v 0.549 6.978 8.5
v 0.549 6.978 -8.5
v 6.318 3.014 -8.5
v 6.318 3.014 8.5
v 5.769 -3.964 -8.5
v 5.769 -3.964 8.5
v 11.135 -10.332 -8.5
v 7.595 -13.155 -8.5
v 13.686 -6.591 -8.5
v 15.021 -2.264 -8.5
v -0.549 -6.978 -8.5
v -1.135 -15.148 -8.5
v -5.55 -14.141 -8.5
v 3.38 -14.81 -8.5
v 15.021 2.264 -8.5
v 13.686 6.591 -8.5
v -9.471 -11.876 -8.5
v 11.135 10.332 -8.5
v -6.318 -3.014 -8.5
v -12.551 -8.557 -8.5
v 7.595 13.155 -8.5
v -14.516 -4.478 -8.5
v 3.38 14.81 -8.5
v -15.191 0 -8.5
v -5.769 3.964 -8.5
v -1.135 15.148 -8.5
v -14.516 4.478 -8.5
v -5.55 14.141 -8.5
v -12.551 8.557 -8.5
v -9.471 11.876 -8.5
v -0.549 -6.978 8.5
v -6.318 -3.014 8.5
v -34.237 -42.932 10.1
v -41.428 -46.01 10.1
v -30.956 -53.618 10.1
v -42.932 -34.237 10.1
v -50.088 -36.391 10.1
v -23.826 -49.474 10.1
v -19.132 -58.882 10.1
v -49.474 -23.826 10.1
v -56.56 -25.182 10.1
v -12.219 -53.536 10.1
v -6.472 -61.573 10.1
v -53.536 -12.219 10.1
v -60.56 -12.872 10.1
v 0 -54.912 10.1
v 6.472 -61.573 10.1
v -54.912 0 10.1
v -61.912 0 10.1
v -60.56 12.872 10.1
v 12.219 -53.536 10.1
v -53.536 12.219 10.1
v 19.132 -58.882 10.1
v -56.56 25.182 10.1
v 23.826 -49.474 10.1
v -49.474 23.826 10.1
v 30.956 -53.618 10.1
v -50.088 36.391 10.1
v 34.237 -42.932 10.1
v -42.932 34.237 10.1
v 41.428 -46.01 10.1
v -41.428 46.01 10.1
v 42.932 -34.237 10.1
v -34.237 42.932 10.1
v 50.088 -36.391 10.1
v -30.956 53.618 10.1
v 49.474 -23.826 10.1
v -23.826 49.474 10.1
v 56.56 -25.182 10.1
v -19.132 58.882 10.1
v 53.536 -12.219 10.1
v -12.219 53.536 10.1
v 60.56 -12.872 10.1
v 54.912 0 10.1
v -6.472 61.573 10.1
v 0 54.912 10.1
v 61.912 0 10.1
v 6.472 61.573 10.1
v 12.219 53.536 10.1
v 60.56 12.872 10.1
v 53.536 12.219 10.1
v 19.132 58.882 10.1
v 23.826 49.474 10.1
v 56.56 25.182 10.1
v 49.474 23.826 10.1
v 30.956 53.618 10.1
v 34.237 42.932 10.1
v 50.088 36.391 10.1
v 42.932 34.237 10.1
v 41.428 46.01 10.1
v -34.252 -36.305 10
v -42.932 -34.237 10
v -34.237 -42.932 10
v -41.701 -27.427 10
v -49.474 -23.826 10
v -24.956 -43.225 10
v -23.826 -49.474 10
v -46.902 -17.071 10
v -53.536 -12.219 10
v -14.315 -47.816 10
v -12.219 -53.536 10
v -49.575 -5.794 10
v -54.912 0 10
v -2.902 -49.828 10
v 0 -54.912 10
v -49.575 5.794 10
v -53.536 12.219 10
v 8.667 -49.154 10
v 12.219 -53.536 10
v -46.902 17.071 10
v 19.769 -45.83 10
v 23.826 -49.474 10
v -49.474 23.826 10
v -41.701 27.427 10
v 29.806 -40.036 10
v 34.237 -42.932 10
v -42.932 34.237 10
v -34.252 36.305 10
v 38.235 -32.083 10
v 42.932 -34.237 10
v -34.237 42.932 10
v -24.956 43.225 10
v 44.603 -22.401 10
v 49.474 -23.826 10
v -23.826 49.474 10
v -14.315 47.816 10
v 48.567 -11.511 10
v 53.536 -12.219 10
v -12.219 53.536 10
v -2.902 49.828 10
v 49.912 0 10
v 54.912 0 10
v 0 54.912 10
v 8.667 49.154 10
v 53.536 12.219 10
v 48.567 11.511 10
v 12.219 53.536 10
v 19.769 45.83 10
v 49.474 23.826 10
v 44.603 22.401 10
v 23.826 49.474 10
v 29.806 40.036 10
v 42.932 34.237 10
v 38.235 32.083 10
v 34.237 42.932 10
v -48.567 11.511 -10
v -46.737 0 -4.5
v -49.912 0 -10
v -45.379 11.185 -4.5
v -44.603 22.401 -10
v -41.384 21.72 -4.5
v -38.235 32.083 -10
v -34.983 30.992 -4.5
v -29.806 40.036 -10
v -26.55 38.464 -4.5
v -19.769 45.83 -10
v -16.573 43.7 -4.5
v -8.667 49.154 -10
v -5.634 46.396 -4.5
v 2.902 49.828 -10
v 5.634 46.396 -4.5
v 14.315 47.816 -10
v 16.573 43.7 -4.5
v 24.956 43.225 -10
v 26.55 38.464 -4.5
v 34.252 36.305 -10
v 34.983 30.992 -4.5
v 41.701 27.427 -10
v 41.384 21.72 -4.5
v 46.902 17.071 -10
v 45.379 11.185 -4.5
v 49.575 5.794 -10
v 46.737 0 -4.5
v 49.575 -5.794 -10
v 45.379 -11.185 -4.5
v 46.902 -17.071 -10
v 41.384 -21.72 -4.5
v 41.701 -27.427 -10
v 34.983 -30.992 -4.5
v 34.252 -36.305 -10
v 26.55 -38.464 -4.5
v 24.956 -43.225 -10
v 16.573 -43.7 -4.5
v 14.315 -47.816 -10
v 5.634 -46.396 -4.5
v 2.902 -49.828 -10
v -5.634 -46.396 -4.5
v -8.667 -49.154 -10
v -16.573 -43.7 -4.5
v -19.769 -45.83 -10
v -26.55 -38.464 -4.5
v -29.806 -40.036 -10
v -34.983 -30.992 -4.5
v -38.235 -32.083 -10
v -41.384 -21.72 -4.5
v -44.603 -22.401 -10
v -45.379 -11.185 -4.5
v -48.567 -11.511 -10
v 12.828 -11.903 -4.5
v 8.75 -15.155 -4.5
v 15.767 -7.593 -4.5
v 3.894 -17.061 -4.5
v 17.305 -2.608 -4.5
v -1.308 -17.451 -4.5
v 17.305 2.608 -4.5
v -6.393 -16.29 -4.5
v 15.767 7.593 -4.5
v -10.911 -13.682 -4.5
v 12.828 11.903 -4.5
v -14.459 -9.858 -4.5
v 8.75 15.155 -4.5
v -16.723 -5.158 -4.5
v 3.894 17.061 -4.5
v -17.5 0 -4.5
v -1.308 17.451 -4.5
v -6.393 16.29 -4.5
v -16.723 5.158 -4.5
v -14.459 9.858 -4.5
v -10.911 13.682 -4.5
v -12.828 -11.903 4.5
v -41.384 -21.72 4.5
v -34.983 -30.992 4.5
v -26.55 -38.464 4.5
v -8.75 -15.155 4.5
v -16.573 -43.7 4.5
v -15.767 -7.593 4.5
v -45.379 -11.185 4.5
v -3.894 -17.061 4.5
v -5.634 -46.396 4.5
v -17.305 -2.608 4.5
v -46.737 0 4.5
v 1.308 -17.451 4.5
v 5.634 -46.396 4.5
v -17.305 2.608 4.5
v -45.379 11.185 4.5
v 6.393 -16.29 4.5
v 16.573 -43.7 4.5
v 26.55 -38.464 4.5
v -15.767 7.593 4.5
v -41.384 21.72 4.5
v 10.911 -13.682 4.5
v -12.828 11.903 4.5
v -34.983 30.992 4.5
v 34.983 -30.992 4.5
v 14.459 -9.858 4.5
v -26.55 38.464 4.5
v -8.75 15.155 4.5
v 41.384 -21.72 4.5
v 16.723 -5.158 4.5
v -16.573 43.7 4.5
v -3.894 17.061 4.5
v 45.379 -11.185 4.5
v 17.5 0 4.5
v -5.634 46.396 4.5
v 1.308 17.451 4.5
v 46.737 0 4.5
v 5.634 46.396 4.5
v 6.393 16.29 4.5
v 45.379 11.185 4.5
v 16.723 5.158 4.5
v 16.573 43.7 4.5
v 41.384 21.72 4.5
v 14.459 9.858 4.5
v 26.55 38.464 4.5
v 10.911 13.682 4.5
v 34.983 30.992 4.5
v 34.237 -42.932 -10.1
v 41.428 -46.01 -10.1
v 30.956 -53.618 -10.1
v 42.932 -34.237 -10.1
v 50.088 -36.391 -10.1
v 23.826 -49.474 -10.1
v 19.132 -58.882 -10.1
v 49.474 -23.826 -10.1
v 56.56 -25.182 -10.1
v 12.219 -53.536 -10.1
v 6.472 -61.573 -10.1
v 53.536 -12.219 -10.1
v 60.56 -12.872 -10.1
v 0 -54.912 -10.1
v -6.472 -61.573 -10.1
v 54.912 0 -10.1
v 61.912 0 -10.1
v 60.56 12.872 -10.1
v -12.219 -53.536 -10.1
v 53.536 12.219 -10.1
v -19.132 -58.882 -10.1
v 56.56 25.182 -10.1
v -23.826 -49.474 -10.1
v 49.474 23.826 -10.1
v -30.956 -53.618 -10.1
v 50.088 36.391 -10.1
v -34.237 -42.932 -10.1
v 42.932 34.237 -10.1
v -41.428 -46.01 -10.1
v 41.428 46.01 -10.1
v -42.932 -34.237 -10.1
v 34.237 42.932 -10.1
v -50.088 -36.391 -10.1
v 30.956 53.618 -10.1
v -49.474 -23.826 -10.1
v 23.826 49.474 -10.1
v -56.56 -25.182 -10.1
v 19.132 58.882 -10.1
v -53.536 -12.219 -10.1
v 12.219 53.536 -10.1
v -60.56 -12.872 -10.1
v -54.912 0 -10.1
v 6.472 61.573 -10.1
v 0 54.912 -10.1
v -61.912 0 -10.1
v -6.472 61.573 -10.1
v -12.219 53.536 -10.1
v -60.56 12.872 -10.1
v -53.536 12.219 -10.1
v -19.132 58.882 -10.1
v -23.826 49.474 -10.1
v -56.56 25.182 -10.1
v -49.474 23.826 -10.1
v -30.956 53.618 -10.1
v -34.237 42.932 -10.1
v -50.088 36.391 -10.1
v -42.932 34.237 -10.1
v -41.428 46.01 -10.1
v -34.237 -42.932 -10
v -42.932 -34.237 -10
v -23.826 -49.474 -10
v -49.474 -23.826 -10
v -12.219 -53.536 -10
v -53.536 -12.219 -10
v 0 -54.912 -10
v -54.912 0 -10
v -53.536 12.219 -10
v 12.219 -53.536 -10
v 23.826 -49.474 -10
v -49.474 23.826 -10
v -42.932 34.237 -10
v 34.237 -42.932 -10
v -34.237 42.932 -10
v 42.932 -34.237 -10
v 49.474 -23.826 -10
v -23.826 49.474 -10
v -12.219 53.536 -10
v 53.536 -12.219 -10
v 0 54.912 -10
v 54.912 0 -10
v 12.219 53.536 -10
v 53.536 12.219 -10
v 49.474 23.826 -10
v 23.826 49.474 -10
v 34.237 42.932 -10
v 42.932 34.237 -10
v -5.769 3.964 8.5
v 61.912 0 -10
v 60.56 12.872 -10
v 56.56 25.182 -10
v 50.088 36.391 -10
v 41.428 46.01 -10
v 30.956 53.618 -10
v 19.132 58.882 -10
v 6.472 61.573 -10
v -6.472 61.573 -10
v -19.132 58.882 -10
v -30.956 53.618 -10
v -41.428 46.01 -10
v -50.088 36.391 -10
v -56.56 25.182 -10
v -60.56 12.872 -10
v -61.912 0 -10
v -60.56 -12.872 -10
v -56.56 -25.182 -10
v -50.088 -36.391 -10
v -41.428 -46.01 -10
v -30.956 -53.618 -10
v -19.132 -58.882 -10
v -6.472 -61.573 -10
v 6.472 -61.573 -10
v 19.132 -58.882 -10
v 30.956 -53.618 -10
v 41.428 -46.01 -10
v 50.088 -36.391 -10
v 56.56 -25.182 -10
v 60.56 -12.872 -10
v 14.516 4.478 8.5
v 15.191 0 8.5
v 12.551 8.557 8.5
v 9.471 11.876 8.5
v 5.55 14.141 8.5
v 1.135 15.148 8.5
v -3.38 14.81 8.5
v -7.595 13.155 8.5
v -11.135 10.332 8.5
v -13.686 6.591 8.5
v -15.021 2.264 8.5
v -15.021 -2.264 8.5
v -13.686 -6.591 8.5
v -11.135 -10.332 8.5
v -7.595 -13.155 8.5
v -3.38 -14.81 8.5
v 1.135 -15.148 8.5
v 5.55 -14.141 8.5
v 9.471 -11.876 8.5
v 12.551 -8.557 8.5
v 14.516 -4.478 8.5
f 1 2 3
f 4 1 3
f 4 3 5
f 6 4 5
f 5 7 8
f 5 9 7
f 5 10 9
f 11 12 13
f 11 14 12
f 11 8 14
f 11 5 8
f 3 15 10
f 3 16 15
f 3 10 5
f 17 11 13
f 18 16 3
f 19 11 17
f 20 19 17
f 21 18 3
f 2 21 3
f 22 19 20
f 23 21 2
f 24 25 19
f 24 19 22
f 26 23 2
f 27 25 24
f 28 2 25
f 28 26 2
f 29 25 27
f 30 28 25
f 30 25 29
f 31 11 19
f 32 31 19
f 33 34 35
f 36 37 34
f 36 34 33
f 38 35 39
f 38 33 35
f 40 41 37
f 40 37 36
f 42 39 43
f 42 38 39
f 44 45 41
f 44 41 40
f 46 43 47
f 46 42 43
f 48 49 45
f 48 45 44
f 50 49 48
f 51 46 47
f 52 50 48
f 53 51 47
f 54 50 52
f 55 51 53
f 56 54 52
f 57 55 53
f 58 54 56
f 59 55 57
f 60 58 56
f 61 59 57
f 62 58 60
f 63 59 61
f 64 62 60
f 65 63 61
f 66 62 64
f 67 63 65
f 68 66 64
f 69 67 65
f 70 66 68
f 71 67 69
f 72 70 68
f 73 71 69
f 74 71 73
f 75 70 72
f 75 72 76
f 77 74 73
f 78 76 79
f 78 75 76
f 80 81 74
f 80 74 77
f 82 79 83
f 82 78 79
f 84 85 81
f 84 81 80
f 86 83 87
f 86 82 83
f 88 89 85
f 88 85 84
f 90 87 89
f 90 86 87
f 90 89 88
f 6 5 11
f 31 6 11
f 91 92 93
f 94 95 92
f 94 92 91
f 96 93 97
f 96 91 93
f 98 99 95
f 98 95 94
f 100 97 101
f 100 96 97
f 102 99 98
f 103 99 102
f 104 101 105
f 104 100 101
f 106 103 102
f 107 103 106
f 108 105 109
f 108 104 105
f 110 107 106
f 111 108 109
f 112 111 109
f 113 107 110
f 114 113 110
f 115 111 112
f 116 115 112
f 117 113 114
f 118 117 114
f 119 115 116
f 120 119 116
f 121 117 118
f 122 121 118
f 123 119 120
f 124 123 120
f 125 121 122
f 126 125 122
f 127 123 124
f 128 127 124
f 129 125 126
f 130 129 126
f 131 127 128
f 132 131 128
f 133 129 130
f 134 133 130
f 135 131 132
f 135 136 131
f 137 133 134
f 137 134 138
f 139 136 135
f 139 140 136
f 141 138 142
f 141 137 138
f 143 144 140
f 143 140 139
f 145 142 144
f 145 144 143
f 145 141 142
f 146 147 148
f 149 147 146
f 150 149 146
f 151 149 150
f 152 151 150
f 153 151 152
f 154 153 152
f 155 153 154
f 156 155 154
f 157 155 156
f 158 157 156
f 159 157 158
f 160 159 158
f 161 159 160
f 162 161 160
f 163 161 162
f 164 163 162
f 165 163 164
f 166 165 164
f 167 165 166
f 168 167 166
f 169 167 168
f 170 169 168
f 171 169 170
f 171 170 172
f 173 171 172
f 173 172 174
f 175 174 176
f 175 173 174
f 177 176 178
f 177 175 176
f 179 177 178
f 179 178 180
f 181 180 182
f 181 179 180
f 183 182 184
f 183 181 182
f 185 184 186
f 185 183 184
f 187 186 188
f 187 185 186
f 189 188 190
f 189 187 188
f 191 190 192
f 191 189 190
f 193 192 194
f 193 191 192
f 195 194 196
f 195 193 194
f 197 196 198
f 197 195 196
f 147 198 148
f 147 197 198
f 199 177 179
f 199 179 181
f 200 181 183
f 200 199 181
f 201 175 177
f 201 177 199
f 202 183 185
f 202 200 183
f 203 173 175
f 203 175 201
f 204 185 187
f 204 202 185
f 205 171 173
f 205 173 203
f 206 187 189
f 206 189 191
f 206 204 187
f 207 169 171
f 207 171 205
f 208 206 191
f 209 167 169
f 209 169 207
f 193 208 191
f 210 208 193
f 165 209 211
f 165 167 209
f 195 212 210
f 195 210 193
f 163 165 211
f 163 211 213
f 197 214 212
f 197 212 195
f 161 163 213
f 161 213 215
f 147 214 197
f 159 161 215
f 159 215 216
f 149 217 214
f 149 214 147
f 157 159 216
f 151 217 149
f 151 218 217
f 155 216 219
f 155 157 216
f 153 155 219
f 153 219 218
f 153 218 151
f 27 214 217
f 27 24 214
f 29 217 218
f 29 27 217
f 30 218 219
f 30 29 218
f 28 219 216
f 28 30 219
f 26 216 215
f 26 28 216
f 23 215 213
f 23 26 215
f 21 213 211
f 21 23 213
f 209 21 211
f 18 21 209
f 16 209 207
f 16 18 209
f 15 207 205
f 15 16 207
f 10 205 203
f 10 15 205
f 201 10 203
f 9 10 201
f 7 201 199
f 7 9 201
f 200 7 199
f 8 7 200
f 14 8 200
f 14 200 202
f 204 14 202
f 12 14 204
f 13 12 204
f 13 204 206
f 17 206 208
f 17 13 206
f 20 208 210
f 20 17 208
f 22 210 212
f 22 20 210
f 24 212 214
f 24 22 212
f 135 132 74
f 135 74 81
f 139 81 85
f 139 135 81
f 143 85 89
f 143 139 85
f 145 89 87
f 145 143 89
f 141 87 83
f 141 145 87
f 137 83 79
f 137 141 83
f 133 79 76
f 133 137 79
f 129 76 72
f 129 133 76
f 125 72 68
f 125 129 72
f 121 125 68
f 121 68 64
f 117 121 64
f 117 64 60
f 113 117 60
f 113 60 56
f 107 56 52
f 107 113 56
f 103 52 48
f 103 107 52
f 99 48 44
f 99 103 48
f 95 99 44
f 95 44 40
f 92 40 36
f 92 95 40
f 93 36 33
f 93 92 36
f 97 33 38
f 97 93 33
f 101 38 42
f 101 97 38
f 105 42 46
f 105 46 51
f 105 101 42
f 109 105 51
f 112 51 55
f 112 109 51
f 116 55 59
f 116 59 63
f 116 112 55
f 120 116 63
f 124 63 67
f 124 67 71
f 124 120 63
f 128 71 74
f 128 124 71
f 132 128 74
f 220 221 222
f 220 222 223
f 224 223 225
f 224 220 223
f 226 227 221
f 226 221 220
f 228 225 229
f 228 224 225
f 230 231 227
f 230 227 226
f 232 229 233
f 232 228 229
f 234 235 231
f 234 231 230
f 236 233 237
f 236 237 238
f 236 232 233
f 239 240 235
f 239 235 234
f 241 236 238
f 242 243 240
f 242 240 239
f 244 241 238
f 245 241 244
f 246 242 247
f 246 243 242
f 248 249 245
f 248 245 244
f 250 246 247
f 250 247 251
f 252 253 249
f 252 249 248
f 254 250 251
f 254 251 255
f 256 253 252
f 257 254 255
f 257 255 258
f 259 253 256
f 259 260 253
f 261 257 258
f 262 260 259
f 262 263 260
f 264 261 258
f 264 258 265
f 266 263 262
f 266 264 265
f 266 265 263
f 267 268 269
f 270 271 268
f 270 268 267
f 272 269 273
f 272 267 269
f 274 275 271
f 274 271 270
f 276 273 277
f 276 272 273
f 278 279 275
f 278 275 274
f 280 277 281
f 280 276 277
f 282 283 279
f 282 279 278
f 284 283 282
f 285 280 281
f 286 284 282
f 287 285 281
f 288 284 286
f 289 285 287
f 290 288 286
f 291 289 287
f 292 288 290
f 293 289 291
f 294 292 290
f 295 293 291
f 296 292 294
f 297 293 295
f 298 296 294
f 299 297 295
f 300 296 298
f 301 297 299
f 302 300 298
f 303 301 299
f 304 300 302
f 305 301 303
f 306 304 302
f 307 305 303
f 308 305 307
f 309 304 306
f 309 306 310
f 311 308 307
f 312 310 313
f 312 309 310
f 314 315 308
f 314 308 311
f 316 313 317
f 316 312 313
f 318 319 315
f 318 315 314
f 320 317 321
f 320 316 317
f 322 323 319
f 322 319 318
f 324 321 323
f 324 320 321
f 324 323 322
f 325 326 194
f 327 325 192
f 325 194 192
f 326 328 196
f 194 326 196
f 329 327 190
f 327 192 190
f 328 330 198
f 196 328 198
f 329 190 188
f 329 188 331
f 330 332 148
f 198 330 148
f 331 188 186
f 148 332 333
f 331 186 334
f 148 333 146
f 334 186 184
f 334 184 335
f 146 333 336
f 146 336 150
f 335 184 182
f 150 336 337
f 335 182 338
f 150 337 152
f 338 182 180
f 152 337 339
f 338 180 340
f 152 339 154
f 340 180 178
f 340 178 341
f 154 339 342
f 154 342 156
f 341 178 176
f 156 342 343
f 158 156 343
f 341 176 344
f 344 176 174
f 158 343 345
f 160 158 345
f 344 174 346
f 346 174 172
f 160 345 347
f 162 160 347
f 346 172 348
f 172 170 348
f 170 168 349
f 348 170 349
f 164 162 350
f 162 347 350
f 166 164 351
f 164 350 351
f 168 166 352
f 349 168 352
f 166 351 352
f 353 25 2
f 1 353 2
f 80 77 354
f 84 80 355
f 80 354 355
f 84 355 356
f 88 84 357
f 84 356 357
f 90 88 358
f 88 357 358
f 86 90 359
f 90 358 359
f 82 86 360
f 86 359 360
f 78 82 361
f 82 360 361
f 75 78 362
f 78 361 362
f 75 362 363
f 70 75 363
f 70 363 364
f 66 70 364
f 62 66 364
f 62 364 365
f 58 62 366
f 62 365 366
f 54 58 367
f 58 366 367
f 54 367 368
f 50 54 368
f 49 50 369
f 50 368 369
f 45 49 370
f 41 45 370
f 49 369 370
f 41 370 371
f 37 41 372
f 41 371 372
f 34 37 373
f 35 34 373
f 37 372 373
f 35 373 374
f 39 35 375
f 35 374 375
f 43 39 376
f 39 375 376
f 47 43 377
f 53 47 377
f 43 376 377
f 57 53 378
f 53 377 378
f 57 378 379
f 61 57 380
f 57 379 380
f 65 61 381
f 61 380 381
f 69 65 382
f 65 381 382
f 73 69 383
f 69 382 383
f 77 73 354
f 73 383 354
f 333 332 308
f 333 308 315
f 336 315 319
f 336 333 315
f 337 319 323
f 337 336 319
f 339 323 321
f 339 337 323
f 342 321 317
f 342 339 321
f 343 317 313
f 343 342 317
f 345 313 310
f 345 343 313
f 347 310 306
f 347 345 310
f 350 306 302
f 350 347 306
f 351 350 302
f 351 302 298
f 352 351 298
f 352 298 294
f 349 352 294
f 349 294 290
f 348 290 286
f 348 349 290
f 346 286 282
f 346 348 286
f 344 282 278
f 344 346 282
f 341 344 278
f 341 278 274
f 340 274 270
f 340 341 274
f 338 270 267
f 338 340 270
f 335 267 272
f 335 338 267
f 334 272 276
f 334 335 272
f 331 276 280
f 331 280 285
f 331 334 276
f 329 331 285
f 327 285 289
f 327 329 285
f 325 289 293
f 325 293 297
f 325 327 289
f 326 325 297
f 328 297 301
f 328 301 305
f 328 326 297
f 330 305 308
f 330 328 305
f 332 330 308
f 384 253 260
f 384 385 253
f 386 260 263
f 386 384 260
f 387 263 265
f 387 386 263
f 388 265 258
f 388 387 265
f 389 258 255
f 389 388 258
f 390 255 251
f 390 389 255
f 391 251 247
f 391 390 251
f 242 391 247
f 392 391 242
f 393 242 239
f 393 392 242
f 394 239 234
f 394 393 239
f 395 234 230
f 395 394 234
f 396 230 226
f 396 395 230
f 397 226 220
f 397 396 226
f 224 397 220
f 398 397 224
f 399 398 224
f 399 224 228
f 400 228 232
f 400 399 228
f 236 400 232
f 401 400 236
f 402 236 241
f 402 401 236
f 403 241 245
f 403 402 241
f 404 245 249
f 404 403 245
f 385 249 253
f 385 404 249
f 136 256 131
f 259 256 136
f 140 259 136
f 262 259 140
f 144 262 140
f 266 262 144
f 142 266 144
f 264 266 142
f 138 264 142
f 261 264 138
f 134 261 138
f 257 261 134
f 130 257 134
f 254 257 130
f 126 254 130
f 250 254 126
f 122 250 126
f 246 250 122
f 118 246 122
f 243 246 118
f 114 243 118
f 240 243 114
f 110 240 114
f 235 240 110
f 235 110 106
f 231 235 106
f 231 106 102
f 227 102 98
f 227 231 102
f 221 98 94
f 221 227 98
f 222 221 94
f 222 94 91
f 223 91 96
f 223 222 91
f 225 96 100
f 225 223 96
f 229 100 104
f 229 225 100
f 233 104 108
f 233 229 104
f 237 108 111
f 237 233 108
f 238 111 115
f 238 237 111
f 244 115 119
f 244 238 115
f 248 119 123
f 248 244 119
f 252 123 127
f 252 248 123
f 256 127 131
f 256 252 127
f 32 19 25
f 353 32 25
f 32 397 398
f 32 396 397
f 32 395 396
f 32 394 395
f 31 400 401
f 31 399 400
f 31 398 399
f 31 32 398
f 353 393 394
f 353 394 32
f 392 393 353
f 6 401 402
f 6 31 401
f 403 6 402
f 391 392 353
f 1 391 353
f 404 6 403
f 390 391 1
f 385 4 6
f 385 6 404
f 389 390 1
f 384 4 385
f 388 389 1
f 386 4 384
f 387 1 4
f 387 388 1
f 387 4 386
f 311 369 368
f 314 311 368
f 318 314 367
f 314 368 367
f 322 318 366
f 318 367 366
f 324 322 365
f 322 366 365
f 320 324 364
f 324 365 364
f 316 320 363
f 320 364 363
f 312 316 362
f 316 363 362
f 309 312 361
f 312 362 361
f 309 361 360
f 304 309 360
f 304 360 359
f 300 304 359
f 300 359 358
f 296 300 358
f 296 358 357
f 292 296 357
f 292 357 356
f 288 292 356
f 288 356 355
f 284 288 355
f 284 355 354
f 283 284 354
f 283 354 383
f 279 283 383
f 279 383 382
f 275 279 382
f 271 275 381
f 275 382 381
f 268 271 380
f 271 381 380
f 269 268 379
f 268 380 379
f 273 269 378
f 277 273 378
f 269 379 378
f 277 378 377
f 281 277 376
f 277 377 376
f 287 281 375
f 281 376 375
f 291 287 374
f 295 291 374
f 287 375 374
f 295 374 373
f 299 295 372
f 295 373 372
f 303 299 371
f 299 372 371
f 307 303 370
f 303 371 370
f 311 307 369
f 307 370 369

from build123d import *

# Parameters (mm, degrees)
SKETCH1_R           = 61.9125
BOSS_EXTRUDE1_DEPTH = 10
SKETCH4_R           = 49.9125
CUT_EXTRUDE1_DEPTH  = 5.5
CUT_EXTRUDE1_TAPER  = 30
SKETCH5_R           = 49.9125
CUT_EXTRUDE2_DEPTH  = 5.5
CUT_EXTRUDE2_TAPER  = 30
SKETCH6_R           = 17.5
BOSS_EXTRUDE2_DEPTH = 4
BOSS_EXTRUDE2_TAPER = 30
SKETCH9_R           = 17.5
BOSS_EXTRUDE3_DEPTH = 4
BOSS_EXTRUDE3_TAPER = 30
CUT_EXTRUDE4_DEPTH  = 24
SKETCH12_R          = 61.9125
SKETCH12_R_2        = 54.9125
BOSS_EXTRUDE4_DEPTH = 0.1
SKETCH14_R          = 61.9125
SKETCH14_R_2        = 54.9125
BOSS_EXTRUDE5_DEPTH = 0.1


with BuildPart() as part:
    # Sketch1 → Boss-Extrude1 (new body, symmetric)
    with BuildSketch(Plane.XY):
        Circle(SKETCH1_R)
    extrude(amount=BOSS_EXTRUDE1_DEPTH, both=True)

    # Sketch4 → Cut-Extrude1 (cut)
    with BuildSketch(Plane.XY.offset(10)):
        Circle(SKETCH4_R)
    extrude(amount=-CUT_EXTRUDE1_DEPTH, taper=CUT_EXTRUDE1_TAPER, mode=Mode.SUBTRACT)

    # Sketch5 → Cut-Extrude2 (cut)
    with BuildSketch(Plane(origin=(0, 0, -10), x_dir=(-1, 0, 0), z_dir=(0, 0, -1))):
        Circle(SKETCH5_R)
    extrude(amount=-CUT_EXTRUDE2_DEPTH, taper=CUT_EXTRUDE2_TAPER, mode=Mode.SUBTRACT)

    # Sketch6 → Boss-Extrude2 (add)
    with BuildSketch(Plane.XY.offset(4.5)):
        Circle(SKETCH6_R)
    extrude(amount=BOSS_EXTRUDE2_DEPTH, taper=BOSS_EXTRUDE2_TAPER)

    # Sketch9 → Boss-Extrude3 (add)
    with BuildSketch(Plane(origin=(0, 0, -4.5), x_dir=(-1, 0, 0), z_dir=(0, 0, -1))):
        Circle(SKETCH9_R)
    extrude(amount=BOSS_EXTRUDE3_DEPTH, taper=BOSS_EXTRUDE3_TAPER)

    # Sketch10 → Cut-Extrude4 (cut)
    with BuildSketch(Plane(origin=(0, 0, -8.5), x_dir=(-1, 0, 0), z_dir=(0, 0, -1))):
        Polygon((6.317873481, -3.014046231), (5.769177344, 3.964415817), (-0.548696137, 6.978462048), (-6.317873481, 3.014046231), (-5.769177344, -3.964415817), (0.548696137, -6.978462048), align=None)
    extrude(amount=-CUT_EXTRUDE4_DEPTH, mode=Mode.SUBTRACT)

    # Sketch12 → Boss-Extrude4 (add)
    with BuildSketch(Plane.XY.offset(10)):
        Circle(SKETCH12_R)
        Circle(SKETCH12_R_2, mode=Mode.SUBTRACT)
    extrude(amount=BOSS_EXTRUDE4_DEPTH)

    # Sketch14 → Boss-Extrude5 (add)
    with BuildSketch(Plane(origin=(0, 0, -10), x_dir=(-1, 0, 0), z_dir=(0, 0, -1))):
        Circle(SKETCH14_R)
        Circle(SKETCH14_R_2, mode=Mode.SUBTRACT)
    extrude(amount=BOSS_EXTRUDE5_DEPTH)


solid = part.part
